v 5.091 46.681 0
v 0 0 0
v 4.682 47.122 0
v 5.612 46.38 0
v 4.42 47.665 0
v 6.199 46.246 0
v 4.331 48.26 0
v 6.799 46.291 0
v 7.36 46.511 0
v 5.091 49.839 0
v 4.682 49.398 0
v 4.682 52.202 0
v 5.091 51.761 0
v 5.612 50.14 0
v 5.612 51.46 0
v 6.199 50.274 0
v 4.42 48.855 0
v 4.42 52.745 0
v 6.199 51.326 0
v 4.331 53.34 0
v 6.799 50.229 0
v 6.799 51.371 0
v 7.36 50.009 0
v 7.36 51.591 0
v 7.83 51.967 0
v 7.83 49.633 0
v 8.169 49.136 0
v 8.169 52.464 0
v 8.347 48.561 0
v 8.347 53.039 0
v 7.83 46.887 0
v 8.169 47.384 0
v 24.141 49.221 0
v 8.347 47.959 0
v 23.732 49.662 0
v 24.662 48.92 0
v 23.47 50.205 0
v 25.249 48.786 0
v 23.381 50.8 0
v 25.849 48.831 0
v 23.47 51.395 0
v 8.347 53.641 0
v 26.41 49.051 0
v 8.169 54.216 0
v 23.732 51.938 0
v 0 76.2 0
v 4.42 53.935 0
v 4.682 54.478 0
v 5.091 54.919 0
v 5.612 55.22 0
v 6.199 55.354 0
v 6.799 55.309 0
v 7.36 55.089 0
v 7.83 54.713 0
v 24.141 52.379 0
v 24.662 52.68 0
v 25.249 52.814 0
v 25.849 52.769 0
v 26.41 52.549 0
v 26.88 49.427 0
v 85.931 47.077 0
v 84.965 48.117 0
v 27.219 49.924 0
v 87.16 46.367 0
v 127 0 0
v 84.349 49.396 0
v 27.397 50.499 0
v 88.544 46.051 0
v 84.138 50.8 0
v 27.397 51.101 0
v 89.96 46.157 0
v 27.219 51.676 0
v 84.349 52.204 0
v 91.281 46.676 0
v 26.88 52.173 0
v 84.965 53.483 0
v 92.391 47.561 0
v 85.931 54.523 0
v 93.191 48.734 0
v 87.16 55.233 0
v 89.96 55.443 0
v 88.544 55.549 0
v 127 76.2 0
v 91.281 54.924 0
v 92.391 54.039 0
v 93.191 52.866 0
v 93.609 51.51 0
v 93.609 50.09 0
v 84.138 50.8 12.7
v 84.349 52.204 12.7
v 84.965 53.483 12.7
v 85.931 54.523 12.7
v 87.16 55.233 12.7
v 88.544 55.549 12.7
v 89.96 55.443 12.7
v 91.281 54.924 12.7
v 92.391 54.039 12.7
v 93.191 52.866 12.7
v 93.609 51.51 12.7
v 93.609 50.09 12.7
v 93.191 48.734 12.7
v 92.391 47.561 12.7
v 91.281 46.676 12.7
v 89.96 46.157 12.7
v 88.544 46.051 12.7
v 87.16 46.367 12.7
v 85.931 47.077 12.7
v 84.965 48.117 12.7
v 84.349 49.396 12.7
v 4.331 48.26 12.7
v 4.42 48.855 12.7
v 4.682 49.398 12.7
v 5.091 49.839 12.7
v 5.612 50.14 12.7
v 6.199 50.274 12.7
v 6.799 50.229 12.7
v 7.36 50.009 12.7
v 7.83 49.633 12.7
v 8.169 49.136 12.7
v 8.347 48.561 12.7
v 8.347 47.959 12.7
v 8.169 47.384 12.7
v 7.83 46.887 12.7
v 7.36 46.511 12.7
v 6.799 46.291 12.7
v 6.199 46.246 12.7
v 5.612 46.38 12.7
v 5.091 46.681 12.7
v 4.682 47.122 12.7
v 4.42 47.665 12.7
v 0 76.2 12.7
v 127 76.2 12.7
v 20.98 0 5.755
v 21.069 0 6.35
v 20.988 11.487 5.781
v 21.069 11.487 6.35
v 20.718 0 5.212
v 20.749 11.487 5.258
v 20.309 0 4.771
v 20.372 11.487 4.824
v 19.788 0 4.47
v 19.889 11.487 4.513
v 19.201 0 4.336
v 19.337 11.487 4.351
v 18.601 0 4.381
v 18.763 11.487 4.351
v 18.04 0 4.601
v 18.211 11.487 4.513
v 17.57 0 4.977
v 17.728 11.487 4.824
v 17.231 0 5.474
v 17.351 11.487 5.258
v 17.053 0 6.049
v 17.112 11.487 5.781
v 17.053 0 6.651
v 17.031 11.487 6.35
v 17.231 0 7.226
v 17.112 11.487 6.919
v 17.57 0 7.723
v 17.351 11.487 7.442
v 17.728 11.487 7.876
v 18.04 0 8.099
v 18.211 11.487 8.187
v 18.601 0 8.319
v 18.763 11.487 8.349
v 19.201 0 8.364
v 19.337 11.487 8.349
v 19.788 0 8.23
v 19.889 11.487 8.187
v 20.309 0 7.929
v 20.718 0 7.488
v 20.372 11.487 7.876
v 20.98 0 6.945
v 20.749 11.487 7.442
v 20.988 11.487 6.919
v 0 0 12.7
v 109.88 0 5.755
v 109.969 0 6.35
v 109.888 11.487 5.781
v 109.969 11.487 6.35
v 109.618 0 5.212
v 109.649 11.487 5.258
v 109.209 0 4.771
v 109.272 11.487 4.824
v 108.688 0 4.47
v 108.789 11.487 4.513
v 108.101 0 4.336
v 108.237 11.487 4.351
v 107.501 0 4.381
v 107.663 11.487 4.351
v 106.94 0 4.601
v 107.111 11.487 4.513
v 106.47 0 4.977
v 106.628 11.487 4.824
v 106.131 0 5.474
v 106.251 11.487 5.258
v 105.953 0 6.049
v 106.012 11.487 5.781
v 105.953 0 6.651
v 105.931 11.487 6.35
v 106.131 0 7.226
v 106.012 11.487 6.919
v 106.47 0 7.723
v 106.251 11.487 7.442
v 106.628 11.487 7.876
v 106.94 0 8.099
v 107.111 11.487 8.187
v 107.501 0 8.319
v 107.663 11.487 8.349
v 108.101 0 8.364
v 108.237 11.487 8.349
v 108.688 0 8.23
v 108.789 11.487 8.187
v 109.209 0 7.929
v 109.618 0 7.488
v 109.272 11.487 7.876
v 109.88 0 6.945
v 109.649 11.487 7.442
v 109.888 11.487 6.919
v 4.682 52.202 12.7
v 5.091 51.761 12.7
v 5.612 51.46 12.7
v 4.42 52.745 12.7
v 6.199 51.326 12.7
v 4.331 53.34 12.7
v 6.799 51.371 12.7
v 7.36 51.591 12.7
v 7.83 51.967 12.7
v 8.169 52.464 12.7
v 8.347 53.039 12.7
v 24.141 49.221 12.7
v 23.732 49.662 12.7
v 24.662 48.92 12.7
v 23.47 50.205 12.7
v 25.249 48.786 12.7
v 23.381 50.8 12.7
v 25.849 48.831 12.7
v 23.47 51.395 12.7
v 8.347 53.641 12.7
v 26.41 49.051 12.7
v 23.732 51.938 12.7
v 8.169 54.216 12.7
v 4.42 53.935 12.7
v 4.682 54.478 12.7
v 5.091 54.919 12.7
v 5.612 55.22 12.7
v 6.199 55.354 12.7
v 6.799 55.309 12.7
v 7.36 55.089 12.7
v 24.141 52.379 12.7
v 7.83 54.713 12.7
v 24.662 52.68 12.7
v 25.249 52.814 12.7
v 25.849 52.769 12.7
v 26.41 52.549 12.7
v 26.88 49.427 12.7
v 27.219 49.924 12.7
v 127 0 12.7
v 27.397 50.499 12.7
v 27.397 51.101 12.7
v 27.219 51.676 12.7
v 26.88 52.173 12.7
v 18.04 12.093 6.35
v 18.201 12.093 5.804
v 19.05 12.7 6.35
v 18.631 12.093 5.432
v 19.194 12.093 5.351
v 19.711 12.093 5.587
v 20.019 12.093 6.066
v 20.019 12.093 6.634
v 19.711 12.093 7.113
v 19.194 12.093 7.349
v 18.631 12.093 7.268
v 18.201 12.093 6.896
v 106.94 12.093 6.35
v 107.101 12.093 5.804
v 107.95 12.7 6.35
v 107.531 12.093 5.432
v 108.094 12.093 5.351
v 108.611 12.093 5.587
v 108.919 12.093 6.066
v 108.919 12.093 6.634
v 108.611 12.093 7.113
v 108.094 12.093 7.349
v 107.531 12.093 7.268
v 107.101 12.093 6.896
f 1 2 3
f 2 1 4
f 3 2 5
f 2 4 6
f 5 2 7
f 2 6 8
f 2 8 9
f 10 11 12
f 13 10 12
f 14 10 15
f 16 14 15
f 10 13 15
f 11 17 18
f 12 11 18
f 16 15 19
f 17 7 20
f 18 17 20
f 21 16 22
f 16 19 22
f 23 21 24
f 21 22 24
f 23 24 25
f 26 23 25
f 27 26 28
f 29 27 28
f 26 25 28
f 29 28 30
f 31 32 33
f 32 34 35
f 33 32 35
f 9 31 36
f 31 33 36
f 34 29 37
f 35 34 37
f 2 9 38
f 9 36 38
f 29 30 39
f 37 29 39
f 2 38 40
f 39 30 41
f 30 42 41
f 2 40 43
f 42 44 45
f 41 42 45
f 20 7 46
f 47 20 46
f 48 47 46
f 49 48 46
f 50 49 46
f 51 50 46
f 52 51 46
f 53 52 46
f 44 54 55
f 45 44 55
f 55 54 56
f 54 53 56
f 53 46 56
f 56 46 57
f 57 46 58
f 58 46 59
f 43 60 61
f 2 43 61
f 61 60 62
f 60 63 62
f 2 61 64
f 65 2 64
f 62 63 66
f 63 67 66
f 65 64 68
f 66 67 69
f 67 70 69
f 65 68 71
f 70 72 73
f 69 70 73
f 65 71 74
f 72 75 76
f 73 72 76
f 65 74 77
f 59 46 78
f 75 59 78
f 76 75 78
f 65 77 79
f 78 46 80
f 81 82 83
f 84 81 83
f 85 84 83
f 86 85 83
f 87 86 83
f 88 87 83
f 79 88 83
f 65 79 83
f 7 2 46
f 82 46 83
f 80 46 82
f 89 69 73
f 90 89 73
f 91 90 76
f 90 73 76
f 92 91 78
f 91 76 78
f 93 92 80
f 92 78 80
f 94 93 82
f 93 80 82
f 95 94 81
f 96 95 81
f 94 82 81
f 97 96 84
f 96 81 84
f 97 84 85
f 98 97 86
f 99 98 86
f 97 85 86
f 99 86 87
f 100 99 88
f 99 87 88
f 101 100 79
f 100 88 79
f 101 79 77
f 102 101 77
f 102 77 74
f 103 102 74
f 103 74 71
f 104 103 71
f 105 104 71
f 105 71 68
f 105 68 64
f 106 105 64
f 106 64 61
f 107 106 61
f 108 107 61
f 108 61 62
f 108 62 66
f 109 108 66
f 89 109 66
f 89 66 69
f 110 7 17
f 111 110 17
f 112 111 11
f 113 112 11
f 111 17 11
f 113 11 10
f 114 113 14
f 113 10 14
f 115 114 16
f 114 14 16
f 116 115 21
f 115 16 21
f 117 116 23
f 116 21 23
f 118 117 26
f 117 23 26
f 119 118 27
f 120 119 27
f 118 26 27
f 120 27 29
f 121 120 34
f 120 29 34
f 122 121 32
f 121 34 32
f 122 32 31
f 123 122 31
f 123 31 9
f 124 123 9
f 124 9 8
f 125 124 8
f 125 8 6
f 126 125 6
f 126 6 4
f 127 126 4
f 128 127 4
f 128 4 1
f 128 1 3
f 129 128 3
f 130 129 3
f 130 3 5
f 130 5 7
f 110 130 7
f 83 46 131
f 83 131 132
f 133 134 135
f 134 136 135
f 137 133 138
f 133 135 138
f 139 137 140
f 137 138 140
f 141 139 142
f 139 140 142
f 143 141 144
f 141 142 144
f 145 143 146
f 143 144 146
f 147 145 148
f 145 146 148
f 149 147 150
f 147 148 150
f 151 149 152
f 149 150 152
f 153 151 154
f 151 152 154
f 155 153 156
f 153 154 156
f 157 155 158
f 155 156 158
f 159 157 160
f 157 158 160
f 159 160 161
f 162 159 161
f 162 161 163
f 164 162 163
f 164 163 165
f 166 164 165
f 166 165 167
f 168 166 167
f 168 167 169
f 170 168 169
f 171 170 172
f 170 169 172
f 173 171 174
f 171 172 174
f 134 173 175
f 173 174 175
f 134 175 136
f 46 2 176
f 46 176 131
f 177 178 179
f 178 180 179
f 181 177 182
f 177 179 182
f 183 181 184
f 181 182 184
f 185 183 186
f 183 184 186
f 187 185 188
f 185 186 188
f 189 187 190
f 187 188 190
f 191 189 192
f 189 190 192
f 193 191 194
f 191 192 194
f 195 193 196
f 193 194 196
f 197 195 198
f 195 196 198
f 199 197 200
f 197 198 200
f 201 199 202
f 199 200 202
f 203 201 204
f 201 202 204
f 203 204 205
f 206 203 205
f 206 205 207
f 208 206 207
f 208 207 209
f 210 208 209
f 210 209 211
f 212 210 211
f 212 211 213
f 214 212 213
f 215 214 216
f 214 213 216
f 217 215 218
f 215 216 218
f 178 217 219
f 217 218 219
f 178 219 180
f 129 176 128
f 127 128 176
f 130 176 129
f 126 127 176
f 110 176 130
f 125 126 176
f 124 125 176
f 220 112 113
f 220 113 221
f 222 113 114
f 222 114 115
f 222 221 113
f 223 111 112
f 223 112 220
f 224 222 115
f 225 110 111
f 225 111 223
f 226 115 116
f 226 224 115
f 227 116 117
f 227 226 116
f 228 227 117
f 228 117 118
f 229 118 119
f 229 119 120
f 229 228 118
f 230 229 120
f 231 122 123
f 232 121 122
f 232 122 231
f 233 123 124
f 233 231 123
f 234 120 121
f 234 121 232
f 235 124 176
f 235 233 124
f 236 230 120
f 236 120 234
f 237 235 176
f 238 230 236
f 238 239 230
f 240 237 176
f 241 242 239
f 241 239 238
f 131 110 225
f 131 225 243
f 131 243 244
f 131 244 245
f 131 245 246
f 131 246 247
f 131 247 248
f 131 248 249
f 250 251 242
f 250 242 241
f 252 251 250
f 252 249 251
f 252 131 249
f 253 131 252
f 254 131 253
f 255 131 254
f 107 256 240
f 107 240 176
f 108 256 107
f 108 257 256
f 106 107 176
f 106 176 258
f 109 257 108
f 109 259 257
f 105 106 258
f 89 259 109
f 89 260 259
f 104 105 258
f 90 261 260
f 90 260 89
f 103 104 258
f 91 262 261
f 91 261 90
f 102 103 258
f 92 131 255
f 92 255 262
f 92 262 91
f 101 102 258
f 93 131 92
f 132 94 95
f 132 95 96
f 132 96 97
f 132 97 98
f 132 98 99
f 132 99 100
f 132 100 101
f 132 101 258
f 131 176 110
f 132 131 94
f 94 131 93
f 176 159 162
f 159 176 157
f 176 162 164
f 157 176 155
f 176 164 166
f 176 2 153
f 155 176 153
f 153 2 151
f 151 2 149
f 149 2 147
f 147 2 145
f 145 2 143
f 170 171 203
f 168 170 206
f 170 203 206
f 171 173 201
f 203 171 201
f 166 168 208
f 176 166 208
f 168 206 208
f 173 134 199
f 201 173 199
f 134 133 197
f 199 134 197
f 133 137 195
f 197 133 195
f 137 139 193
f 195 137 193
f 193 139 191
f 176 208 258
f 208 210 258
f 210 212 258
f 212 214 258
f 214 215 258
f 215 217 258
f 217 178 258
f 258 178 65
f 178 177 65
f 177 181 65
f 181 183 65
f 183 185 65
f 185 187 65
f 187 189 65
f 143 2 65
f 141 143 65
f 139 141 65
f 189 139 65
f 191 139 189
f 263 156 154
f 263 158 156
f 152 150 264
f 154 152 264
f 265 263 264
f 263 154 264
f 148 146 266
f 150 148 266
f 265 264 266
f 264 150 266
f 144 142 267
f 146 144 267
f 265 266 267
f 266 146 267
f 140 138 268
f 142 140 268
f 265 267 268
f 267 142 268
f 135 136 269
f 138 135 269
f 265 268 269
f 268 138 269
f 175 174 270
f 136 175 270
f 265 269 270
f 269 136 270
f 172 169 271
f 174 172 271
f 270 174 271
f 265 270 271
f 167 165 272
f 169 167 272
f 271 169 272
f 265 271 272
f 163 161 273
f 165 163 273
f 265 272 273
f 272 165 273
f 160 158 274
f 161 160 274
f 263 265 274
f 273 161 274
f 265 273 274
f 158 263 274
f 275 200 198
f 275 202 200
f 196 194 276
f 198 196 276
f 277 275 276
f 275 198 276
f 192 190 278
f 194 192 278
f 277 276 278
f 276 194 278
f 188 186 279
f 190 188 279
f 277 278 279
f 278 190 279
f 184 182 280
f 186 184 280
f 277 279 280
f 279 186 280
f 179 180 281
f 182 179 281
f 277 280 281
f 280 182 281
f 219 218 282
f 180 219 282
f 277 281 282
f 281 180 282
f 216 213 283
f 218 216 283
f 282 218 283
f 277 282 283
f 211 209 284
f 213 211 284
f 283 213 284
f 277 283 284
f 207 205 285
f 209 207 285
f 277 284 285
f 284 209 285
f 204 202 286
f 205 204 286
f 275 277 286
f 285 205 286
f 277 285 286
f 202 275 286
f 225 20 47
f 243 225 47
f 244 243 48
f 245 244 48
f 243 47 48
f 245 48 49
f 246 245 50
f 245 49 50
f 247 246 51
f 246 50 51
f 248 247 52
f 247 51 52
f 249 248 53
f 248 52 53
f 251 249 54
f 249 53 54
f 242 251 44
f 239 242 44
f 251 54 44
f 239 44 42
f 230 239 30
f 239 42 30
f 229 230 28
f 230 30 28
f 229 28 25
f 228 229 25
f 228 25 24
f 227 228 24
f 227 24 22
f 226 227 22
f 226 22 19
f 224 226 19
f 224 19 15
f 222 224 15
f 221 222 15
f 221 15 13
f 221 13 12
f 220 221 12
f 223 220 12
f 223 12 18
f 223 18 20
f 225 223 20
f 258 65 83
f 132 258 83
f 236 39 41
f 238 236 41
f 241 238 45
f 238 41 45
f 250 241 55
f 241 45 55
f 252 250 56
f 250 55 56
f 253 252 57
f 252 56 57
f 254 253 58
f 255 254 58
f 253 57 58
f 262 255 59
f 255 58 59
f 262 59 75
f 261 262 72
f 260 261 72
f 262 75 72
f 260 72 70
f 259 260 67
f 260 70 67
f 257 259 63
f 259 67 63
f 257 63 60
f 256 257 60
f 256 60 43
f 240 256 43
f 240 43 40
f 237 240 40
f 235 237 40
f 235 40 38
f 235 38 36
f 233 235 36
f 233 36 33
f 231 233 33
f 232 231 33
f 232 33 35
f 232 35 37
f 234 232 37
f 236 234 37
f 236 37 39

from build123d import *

# Parameters (mm, degrees)
SKETCH1_W                       = 127
SKETCH1_H                       = 76.2
BOSS_EXTRUDE1_DEPTH             = 12.7
F_1_32_0_159_DIAMETER_HOLE1_D   = 4.0386
F_10_32_TAPPED_HOLE1_D          = 4.0386
F_10_32_TAPPED_HOLE1_DEPTH      = 11.486682152
F_10_32_TAPPED_HOLE1_TIP        = 1.213317848
F_3_8_0_375_DIAMETER_HOLE1_D    = 9.525
F_10_32_TAPPED_HOLE2_D          = 4.0386
F_10_32_TAPPED_HOLE2_DEPTH      = 14.478
F_10_32_TAPPED_HOLE2_TIP        = 1.213317848
F_21_0_159_DIAMETER_HOLE1_D     = 4.0386
F_21_0_159_DIAMETER_HOLE1_DEPTH = 14.478
F_21_0_159_DIAMETER_HOLE1_TIP   = 1.213317848


with BuildPart() as part:
    # Sketch1 → Boss-Extrude1 (new body)
    with BuildSketch(Plane.XY):
        with Locations((63.5, 38.1)):
            Rectangle(SKETCH1_W, SKETCH1_H)
    extrude(amount=BOSS_EXTRUDE1_DEPTH)

    # 1/32 (0.159) Diameter Hole1 (through all)
    with Locations(Plane.XY.offset(12.7)):
        with Locations((25.4, 50.8)):
            Hole(F_1_32_0_159_DIAMETER_HOLE1_D / 2)

    # #10-32 Tapped Hole1
    with Locations(Plane(origin=(0, 0, 0), x_dir=(-1, 0, 0), z_dir=(0, -1, 0))):
        with Locations((-19.05, -6.35), (-107.95, -6.35)):
            Hole(F_10_32_TAPPED_HOLE1_D / 2, depth=F_10_32_TAPPED_HOLE1_DEPTH)
            with Locations((0, 0, -(F_10_32_TAPPED_HOLE1_DEPTH + F_10_32_TAPPED_HOLE1_TIP / 2))):  # 118° drill point
                Cone(0, F_10_32_TAPPED_HOLE1_D / 2, F_10_32_TAPPED_HOLE1_TIP, mode=Mode.SUBTRACT)

    # 3/8 (0.375) Diameter Hole1 (through all)
    with Locations(Plane.XY.offset(12.7)):
        with Locations((88.9, 50.8)):
            Hole(F_3_8_0_375_DIAMETER_HOLE1_D / 2)

    # #10-32 Tapped Hole2
    with Locations(Plane.XY.offset(12.7)):
        with Locations((6.35, 48.26)):
            Hole(F_10_32_TAPPED_HOLE2_D / 2, depth=F_10_32_TAPPED_HOLE2_DEPTH)
            with Locations((0, 0, -(F_10_32_TAPPED_HOLE2_DEPTH + F_10_32_TAPPED_HOLE2_TIP / 2))):  # 118° drill point
                Cone(0, F_10_32_TAPPED_HOLE2_D / 2, F_10_32_TAPPED_HOLE2_TIP, mode=Mode.SUBTRACT)

    # #21 (0.159) Diameter Hole1
    with Locations(Plane.XY.offset(12.7)):
        with Locations((6.35, 53.34)):
            Hole(F_21_0_159_DIAMETER_HOLE1_D / 2, depth=F_21_0_159_DIAMETER_HOLE1_DEPTH)
            with Locations((0, 0, -(F_21_0_159_DIAMETER_HOLE1_DEPTH + F_21_0_159_DIAMETER_HOLE1_TIP / 2))):  # 118° drill point
                Cone(0, F_21_0_159_DIAMETER_HOLE1_D / 2, F_21_0_159_DIAMETER_HOLE1_TIP, mode=Mode.SUBTRACT)


solid = part.part
